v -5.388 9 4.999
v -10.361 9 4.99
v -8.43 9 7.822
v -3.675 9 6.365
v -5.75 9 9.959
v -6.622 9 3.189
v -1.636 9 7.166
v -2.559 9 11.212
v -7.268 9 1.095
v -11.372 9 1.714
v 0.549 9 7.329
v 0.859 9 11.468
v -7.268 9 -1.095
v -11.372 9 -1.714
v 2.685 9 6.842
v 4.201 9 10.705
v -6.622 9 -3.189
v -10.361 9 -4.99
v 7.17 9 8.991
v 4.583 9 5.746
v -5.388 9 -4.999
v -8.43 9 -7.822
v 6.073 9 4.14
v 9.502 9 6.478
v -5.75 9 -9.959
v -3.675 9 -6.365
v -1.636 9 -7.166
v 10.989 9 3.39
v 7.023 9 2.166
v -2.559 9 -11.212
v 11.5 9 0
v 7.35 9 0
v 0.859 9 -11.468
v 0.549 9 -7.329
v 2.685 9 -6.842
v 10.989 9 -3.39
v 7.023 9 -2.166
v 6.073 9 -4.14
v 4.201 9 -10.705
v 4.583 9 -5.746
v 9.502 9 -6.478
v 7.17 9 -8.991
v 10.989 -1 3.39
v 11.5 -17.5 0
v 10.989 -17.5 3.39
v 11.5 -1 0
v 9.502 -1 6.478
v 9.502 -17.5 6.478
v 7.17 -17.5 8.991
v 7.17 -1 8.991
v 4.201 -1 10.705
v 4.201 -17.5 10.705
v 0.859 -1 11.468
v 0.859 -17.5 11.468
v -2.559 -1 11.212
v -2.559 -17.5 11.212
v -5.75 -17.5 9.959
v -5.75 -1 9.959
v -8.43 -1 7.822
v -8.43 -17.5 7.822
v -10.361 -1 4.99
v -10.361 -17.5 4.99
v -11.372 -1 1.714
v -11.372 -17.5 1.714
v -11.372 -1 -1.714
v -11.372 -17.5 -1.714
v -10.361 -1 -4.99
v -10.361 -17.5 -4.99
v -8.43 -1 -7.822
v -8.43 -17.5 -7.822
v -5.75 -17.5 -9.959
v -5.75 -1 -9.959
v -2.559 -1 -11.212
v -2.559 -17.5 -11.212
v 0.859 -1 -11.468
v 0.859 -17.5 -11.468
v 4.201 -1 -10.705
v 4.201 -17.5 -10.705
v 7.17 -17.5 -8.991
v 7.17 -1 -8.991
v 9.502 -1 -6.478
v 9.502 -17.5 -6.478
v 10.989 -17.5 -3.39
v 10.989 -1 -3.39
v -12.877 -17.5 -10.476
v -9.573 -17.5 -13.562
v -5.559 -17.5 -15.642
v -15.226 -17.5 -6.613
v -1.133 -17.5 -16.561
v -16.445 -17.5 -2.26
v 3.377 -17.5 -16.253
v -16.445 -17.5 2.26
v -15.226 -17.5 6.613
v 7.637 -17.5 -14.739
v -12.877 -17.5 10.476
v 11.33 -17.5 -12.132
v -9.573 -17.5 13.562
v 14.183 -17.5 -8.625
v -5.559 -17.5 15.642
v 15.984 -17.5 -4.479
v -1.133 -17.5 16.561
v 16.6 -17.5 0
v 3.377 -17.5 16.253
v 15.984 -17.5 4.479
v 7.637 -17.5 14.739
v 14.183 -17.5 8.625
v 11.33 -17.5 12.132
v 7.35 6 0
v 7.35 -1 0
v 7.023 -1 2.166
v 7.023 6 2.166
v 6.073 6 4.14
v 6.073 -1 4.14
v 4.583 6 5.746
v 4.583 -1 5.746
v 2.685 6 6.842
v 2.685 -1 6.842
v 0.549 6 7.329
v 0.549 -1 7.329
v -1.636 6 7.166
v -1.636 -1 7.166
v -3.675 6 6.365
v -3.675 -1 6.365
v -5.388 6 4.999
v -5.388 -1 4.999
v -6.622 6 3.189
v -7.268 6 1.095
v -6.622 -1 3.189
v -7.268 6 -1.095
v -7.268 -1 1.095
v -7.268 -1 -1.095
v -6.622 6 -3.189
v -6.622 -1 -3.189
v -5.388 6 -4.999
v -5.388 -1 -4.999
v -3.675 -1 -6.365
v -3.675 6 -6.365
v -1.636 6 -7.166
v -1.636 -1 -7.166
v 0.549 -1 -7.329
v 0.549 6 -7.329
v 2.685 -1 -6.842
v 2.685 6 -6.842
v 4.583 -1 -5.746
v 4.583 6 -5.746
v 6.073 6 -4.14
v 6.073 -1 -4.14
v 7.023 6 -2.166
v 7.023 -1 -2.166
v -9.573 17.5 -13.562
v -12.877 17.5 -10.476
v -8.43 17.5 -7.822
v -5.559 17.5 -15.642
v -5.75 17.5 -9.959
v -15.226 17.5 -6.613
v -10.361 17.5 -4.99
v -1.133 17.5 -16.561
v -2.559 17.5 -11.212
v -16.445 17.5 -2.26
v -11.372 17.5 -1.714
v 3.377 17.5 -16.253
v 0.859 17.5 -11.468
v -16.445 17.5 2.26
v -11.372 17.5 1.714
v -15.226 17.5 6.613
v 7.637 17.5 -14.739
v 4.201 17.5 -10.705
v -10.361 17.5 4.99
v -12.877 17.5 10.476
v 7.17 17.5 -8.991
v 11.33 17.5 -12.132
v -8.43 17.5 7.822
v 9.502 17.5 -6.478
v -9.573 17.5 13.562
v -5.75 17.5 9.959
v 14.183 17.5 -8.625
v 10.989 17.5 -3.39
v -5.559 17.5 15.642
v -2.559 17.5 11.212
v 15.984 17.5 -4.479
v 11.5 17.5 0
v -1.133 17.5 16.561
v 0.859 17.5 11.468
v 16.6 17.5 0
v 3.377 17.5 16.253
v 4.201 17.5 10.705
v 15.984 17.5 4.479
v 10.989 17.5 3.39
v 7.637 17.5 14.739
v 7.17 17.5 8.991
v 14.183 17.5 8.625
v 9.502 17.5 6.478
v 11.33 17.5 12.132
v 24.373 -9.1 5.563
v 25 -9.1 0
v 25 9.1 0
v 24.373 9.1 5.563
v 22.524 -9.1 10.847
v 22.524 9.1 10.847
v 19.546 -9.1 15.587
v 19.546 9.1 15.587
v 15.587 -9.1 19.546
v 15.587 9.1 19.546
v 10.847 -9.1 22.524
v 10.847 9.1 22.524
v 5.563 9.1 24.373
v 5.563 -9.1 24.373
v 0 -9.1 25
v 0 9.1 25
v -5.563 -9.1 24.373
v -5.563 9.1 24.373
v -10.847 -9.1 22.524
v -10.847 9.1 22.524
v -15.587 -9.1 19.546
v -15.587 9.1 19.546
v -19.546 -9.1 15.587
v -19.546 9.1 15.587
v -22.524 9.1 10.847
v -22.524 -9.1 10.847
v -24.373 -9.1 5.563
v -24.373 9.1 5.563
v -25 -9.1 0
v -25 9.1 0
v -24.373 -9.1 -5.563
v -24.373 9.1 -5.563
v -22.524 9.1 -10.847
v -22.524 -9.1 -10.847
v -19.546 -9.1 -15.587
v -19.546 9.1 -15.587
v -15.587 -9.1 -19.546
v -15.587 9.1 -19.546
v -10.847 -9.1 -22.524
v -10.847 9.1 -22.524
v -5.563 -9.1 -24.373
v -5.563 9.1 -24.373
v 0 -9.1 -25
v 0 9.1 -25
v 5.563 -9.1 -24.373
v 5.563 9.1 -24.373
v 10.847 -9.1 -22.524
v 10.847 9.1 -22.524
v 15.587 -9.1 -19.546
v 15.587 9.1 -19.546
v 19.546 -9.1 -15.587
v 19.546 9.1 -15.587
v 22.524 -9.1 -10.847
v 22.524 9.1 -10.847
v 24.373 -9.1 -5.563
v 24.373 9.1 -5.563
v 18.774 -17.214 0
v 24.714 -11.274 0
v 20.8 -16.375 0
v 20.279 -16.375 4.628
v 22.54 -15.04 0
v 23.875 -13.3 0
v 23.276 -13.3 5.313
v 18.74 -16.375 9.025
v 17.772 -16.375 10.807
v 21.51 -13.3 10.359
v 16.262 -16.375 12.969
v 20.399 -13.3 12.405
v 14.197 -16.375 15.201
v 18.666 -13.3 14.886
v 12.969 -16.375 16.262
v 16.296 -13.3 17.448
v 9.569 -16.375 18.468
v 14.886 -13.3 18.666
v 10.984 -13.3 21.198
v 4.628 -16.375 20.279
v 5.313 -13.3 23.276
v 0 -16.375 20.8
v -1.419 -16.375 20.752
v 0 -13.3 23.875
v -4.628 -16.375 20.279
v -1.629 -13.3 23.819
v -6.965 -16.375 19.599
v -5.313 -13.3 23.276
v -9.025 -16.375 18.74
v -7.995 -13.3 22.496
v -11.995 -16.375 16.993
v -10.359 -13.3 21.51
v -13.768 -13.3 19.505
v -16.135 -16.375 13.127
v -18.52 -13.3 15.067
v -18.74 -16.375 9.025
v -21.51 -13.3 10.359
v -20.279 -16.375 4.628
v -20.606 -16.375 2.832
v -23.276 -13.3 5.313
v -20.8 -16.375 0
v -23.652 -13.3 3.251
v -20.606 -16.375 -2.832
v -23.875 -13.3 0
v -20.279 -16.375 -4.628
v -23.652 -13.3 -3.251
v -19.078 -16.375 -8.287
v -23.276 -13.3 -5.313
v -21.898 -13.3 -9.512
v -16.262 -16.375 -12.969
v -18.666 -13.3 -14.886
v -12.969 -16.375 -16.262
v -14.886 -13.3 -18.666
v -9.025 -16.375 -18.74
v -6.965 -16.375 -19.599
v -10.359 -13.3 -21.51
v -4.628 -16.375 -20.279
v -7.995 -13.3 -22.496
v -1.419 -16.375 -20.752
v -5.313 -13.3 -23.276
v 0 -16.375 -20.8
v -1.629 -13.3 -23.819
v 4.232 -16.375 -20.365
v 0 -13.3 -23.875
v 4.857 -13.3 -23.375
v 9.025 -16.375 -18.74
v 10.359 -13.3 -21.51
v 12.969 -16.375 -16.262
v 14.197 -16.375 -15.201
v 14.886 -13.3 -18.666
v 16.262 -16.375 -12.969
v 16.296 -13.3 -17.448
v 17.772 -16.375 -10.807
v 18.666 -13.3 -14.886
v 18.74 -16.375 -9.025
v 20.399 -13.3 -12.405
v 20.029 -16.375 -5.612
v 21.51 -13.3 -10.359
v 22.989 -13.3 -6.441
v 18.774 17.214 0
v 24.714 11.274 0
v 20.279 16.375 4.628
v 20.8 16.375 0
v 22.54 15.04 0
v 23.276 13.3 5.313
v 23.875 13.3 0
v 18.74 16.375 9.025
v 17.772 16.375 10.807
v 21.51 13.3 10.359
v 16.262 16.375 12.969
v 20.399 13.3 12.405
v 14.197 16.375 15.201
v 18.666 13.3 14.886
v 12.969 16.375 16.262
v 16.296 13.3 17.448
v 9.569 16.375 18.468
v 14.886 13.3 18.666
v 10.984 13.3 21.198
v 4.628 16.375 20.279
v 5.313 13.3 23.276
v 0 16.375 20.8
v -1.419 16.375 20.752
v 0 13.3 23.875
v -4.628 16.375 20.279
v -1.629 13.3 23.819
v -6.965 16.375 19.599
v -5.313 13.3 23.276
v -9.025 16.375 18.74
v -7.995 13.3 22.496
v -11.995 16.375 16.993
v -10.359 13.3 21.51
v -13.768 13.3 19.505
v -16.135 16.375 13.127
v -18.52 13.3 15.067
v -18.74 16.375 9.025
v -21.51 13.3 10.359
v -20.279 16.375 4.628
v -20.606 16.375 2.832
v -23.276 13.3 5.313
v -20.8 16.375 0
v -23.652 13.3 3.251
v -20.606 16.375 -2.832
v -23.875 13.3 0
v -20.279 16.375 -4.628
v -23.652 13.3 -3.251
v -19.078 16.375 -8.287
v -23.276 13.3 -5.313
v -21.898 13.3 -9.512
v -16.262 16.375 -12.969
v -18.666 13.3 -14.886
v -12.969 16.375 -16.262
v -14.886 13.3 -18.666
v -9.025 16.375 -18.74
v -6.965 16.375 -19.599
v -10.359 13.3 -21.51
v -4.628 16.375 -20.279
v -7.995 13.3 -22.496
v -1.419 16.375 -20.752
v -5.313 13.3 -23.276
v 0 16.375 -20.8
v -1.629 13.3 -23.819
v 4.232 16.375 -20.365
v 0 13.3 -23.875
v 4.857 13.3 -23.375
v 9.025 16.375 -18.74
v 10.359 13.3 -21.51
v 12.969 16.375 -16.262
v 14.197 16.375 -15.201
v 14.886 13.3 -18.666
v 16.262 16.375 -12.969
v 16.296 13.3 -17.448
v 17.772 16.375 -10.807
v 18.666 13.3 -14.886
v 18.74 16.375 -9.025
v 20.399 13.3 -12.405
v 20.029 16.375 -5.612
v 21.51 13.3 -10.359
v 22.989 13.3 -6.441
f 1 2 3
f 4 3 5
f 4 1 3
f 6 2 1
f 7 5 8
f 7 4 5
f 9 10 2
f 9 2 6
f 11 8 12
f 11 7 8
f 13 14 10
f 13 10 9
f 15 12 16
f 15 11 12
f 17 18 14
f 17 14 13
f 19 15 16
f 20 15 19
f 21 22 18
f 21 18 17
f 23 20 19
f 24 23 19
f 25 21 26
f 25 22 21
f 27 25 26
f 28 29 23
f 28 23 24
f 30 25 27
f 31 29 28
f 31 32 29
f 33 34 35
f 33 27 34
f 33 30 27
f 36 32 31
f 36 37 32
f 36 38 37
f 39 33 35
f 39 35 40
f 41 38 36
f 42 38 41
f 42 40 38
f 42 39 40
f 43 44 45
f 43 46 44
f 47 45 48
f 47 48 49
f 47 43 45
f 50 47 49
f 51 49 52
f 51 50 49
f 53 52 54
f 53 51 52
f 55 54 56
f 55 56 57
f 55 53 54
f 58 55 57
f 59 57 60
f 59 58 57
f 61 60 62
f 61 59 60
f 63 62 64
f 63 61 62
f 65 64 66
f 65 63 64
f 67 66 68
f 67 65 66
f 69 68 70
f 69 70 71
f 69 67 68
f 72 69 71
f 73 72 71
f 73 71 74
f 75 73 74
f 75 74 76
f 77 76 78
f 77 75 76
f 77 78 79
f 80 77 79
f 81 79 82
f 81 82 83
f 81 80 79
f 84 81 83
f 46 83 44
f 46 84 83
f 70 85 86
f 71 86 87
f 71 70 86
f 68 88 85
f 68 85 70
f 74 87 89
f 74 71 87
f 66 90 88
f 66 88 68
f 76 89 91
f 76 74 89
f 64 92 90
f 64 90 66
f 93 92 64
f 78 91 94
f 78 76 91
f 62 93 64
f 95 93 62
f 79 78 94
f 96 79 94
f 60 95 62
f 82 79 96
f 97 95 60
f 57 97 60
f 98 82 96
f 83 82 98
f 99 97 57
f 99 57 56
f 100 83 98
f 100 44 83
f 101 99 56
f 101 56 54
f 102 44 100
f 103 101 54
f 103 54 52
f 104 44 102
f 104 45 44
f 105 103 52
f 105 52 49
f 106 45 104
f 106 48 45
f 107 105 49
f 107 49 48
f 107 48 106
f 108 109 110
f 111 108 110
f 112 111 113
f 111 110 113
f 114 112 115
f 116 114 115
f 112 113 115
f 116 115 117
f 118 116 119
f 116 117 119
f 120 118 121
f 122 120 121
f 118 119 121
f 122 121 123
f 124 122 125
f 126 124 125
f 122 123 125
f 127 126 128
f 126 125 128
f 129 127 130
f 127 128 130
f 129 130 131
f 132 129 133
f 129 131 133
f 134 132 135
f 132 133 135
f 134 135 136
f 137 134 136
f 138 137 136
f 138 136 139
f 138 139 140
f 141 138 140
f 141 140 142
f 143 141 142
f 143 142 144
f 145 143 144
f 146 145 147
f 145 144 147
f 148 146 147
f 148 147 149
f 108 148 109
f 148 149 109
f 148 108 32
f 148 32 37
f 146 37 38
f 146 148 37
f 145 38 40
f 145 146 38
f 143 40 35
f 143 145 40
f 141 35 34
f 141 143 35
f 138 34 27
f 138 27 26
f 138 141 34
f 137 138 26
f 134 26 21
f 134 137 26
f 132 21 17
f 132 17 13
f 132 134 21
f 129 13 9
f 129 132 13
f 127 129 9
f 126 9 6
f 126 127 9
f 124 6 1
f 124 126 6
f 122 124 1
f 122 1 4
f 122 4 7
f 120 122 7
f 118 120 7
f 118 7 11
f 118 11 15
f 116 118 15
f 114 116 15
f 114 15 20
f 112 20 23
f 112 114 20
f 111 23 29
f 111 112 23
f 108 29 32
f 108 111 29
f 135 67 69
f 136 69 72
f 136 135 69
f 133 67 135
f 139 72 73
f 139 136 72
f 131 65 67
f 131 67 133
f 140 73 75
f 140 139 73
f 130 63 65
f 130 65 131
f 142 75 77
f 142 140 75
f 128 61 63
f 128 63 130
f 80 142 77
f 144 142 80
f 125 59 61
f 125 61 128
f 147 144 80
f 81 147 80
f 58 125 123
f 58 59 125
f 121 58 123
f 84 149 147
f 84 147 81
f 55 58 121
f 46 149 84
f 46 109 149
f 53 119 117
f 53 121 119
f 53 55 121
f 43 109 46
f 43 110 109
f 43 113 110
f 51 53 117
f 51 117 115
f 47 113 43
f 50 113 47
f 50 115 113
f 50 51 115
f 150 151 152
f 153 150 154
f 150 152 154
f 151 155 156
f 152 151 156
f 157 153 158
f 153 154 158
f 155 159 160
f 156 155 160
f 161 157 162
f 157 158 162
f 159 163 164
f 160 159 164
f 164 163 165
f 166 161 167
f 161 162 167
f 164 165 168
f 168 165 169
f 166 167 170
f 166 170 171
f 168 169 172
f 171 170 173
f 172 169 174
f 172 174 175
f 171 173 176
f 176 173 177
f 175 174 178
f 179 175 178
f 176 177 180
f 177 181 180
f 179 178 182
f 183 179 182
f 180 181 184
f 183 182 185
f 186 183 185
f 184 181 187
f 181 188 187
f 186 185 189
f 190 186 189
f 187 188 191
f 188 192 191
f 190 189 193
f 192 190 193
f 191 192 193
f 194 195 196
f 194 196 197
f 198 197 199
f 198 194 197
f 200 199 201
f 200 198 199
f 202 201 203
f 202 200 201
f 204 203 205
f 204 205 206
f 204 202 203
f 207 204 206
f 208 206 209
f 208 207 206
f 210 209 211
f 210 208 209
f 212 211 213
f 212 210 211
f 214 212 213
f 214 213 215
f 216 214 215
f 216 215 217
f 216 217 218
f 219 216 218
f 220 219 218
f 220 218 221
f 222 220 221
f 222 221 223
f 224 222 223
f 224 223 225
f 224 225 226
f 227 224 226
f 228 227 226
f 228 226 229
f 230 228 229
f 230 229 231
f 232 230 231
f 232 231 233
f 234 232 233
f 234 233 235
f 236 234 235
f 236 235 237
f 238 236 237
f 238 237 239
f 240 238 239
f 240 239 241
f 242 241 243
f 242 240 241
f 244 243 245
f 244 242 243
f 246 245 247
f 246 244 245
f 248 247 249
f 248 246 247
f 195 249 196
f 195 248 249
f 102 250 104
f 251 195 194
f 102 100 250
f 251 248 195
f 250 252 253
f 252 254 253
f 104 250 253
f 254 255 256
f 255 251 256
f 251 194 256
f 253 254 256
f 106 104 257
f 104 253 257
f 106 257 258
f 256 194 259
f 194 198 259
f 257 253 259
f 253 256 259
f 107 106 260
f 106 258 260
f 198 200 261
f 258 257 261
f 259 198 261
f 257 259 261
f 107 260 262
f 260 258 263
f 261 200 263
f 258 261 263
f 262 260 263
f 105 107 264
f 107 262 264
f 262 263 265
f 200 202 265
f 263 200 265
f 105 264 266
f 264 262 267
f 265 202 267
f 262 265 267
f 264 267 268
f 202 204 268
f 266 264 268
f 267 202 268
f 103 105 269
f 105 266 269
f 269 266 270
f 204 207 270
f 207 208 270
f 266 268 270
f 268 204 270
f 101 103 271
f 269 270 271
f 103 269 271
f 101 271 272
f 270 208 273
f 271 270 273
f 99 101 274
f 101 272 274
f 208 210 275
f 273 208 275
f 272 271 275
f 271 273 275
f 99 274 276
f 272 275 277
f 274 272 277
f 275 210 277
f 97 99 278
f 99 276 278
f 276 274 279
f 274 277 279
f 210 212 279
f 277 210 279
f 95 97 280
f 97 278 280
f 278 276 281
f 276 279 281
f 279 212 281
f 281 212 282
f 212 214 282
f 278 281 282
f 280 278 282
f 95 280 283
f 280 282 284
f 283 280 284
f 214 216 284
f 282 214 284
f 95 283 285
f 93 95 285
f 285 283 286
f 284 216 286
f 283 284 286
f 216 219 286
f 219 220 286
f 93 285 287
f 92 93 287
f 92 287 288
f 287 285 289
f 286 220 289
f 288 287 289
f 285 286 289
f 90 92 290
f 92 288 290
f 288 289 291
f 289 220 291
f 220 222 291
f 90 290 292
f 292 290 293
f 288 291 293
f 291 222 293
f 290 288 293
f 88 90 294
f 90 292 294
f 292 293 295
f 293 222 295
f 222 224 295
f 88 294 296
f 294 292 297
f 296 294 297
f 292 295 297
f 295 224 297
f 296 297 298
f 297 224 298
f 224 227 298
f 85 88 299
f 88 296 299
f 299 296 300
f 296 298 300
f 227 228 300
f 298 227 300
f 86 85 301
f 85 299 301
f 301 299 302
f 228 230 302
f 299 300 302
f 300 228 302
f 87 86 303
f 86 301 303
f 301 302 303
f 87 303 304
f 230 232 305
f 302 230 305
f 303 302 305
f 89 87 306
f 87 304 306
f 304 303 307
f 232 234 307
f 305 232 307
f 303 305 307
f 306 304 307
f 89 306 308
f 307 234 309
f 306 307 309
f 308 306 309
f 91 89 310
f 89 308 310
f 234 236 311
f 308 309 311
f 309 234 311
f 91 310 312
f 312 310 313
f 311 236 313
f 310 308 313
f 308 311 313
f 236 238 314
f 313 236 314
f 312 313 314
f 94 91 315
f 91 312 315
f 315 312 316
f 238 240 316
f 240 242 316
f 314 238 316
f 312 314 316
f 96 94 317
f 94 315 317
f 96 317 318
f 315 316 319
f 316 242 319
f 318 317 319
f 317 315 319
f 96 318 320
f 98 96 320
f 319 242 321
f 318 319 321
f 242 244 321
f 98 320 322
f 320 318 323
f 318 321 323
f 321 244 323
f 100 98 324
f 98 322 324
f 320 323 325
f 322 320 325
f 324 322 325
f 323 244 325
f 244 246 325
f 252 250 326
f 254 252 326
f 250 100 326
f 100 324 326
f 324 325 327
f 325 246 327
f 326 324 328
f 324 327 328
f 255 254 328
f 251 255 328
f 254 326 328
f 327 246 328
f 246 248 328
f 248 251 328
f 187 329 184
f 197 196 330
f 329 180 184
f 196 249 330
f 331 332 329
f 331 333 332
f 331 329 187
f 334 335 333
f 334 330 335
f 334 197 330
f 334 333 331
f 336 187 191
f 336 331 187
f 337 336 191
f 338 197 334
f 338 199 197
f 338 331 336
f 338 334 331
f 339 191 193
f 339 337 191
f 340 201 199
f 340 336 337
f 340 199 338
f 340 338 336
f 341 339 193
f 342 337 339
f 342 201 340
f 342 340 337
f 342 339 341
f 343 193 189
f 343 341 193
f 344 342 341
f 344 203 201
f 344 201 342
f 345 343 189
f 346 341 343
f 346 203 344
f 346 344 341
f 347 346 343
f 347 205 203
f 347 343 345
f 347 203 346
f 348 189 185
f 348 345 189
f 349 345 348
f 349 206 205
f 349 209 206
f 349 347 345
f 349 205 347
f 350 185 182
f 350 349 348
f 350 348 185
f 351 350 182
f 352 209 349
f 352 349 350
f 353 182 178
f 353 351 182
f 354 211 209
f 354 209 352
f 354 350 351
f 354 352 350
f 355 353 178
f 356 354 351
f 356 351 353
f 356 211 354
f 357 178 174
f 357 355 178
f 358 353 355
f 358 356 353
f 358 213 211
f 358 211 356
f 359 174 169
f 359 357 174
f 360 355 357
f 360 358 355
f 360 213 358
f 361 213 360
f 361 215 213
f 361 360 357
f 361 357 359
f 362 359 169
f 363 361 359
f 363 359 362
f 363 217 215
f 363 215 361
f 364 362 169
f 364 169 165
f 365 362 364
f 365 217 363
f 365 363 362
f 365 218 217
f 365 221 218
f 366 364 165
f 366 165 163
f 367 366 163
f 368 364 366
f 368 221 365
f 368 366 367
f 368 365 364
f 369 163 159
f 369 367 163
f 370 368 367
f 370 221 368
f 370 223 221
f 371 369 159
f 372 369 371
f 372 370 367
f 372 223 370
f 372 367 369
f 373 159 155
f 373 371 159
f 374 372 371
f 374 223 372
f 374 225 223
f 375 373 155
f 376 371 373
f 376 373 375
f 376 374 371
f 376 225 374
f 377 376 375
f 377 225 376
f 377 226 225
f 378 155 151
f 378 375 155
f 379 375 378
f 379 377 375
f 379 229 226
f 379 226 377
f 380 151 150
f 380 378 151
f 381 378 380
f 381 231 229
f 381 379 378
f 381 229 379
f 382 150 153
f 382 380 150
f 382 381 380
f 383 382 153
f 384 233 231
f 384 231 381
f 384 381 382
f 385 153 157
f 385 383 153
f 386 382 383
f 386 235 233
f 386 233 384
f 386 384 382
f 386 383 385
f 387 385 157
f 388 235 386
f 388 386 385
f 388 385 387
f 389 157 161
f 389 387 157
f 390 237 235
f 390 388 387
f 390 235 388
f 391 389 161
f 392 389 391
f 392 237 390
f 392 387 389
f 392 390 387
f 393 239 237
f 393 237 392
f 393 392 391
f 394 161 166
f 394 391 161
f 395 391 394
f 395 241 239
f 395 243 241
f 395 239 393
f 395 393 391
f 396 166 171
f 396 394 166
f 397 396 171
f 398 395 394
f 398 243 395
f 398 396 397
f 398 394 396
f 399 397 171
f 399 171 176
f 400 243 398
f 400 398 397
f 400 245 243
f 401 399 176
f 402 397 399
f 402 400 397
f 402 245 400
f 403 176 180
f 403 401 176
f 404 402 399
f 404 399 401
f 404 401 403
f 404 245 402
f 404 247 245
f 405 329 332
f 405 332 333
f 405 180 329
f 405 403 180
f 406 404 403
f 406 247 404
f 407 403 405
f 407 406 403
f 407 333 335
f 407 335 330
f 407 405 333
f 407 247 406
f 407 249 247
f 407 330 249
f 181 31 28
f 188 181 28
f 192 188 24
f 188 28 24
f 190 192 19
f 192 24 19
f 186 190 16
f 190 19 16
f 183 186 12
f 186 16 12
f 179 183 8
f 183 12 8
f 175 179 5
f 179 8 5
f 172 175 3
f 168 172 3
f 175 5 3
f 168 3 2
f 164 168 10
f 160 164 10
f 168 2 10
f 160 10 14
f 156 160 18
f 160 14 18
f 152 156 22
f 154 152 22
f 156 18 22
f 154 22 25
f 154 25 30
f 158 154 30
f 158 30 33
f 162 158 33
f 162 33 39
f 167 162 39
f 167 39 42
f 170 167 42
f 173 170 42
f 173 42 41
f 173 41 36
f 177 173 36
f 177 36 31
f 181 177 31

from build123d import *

# Parameters (mm, degrees)
F0_R          = 25
F0_R_2        = 11.5
F1_DEPTH      = 17.5
F1_DEPTH_BACK = 17.5
F0_R_3        = 7.35
F2_DEPTH      = 6
F3_DEPTH      = 6
F4_R          = 8.4
F2_FACE_R     = 11.5
F2_FACE_R_2   = 7.35
F6_DEPTH      = 5
F3_FACE_R     = 11.5
F3_FACE_R_2   = 7.35
F7_DEPTH      = 3


with BuildPart() as f1:
    # F0 (on Front) → F1 (new body, two sides)
    with BuildSketch(Plane.XZ) as f1_sk:
        Circle(F0_R)
        Circle(F0_R_2, mode=Mode.SUBTRACT)
    extrude(amount=F1_DEPTH)
    extrude(f1_sk.sketch, amount=-F1_DEPTH_BACK)

    # F0 (on Front) → F2 (join)
    with BuildSketch(Plane.XZ):
        Circle(F0_R_2)
        Circle(F0_R_3, mode=Mode.SUBTRACT)
    extrude(amount=F2_DEPTH)

    # F0 (on Front) → F3 (join)
    with BuildSketch(Plane.XZ):
        Circle(F0_R_2)
        Circle(F0_R_3, mode=Mode.SUBTRACT)
    extrude(amount=-F3_DEPTH)

    # F4
    f4_edges = [f1.edges().sort_by_distance(p)[0] for p in [
        (-25, -17.5, 0),
        (-25, 17.5, 0),
    ]]
    fillet(f4_edges, radius=F4_R)

    # F2_face (on face) → F6 (cut)
    with BuildSketch(Plane.XZ.offset(6)):
        Circle(F2_FACE_R)
        Circle(F2_FACE_R_2, mode=Mode.SUBTRACT)
    extrude(amount=-F6_DEPTH, mode=Mode.SUBTRACT)

    # F3_face (on face) → F7 (join)
    with BuildSketch(Plane(origin=(0, 6, 0), x_dir=(1, 0, 0), z_dir=(0, 1, 0))):
        Circle(F3_FACE_R)
        Circle(F3_FACE_R_2, mode=Mode.SUBTRACT)
    extrude(amount=F7_DEPTH)


solid = f1.part
